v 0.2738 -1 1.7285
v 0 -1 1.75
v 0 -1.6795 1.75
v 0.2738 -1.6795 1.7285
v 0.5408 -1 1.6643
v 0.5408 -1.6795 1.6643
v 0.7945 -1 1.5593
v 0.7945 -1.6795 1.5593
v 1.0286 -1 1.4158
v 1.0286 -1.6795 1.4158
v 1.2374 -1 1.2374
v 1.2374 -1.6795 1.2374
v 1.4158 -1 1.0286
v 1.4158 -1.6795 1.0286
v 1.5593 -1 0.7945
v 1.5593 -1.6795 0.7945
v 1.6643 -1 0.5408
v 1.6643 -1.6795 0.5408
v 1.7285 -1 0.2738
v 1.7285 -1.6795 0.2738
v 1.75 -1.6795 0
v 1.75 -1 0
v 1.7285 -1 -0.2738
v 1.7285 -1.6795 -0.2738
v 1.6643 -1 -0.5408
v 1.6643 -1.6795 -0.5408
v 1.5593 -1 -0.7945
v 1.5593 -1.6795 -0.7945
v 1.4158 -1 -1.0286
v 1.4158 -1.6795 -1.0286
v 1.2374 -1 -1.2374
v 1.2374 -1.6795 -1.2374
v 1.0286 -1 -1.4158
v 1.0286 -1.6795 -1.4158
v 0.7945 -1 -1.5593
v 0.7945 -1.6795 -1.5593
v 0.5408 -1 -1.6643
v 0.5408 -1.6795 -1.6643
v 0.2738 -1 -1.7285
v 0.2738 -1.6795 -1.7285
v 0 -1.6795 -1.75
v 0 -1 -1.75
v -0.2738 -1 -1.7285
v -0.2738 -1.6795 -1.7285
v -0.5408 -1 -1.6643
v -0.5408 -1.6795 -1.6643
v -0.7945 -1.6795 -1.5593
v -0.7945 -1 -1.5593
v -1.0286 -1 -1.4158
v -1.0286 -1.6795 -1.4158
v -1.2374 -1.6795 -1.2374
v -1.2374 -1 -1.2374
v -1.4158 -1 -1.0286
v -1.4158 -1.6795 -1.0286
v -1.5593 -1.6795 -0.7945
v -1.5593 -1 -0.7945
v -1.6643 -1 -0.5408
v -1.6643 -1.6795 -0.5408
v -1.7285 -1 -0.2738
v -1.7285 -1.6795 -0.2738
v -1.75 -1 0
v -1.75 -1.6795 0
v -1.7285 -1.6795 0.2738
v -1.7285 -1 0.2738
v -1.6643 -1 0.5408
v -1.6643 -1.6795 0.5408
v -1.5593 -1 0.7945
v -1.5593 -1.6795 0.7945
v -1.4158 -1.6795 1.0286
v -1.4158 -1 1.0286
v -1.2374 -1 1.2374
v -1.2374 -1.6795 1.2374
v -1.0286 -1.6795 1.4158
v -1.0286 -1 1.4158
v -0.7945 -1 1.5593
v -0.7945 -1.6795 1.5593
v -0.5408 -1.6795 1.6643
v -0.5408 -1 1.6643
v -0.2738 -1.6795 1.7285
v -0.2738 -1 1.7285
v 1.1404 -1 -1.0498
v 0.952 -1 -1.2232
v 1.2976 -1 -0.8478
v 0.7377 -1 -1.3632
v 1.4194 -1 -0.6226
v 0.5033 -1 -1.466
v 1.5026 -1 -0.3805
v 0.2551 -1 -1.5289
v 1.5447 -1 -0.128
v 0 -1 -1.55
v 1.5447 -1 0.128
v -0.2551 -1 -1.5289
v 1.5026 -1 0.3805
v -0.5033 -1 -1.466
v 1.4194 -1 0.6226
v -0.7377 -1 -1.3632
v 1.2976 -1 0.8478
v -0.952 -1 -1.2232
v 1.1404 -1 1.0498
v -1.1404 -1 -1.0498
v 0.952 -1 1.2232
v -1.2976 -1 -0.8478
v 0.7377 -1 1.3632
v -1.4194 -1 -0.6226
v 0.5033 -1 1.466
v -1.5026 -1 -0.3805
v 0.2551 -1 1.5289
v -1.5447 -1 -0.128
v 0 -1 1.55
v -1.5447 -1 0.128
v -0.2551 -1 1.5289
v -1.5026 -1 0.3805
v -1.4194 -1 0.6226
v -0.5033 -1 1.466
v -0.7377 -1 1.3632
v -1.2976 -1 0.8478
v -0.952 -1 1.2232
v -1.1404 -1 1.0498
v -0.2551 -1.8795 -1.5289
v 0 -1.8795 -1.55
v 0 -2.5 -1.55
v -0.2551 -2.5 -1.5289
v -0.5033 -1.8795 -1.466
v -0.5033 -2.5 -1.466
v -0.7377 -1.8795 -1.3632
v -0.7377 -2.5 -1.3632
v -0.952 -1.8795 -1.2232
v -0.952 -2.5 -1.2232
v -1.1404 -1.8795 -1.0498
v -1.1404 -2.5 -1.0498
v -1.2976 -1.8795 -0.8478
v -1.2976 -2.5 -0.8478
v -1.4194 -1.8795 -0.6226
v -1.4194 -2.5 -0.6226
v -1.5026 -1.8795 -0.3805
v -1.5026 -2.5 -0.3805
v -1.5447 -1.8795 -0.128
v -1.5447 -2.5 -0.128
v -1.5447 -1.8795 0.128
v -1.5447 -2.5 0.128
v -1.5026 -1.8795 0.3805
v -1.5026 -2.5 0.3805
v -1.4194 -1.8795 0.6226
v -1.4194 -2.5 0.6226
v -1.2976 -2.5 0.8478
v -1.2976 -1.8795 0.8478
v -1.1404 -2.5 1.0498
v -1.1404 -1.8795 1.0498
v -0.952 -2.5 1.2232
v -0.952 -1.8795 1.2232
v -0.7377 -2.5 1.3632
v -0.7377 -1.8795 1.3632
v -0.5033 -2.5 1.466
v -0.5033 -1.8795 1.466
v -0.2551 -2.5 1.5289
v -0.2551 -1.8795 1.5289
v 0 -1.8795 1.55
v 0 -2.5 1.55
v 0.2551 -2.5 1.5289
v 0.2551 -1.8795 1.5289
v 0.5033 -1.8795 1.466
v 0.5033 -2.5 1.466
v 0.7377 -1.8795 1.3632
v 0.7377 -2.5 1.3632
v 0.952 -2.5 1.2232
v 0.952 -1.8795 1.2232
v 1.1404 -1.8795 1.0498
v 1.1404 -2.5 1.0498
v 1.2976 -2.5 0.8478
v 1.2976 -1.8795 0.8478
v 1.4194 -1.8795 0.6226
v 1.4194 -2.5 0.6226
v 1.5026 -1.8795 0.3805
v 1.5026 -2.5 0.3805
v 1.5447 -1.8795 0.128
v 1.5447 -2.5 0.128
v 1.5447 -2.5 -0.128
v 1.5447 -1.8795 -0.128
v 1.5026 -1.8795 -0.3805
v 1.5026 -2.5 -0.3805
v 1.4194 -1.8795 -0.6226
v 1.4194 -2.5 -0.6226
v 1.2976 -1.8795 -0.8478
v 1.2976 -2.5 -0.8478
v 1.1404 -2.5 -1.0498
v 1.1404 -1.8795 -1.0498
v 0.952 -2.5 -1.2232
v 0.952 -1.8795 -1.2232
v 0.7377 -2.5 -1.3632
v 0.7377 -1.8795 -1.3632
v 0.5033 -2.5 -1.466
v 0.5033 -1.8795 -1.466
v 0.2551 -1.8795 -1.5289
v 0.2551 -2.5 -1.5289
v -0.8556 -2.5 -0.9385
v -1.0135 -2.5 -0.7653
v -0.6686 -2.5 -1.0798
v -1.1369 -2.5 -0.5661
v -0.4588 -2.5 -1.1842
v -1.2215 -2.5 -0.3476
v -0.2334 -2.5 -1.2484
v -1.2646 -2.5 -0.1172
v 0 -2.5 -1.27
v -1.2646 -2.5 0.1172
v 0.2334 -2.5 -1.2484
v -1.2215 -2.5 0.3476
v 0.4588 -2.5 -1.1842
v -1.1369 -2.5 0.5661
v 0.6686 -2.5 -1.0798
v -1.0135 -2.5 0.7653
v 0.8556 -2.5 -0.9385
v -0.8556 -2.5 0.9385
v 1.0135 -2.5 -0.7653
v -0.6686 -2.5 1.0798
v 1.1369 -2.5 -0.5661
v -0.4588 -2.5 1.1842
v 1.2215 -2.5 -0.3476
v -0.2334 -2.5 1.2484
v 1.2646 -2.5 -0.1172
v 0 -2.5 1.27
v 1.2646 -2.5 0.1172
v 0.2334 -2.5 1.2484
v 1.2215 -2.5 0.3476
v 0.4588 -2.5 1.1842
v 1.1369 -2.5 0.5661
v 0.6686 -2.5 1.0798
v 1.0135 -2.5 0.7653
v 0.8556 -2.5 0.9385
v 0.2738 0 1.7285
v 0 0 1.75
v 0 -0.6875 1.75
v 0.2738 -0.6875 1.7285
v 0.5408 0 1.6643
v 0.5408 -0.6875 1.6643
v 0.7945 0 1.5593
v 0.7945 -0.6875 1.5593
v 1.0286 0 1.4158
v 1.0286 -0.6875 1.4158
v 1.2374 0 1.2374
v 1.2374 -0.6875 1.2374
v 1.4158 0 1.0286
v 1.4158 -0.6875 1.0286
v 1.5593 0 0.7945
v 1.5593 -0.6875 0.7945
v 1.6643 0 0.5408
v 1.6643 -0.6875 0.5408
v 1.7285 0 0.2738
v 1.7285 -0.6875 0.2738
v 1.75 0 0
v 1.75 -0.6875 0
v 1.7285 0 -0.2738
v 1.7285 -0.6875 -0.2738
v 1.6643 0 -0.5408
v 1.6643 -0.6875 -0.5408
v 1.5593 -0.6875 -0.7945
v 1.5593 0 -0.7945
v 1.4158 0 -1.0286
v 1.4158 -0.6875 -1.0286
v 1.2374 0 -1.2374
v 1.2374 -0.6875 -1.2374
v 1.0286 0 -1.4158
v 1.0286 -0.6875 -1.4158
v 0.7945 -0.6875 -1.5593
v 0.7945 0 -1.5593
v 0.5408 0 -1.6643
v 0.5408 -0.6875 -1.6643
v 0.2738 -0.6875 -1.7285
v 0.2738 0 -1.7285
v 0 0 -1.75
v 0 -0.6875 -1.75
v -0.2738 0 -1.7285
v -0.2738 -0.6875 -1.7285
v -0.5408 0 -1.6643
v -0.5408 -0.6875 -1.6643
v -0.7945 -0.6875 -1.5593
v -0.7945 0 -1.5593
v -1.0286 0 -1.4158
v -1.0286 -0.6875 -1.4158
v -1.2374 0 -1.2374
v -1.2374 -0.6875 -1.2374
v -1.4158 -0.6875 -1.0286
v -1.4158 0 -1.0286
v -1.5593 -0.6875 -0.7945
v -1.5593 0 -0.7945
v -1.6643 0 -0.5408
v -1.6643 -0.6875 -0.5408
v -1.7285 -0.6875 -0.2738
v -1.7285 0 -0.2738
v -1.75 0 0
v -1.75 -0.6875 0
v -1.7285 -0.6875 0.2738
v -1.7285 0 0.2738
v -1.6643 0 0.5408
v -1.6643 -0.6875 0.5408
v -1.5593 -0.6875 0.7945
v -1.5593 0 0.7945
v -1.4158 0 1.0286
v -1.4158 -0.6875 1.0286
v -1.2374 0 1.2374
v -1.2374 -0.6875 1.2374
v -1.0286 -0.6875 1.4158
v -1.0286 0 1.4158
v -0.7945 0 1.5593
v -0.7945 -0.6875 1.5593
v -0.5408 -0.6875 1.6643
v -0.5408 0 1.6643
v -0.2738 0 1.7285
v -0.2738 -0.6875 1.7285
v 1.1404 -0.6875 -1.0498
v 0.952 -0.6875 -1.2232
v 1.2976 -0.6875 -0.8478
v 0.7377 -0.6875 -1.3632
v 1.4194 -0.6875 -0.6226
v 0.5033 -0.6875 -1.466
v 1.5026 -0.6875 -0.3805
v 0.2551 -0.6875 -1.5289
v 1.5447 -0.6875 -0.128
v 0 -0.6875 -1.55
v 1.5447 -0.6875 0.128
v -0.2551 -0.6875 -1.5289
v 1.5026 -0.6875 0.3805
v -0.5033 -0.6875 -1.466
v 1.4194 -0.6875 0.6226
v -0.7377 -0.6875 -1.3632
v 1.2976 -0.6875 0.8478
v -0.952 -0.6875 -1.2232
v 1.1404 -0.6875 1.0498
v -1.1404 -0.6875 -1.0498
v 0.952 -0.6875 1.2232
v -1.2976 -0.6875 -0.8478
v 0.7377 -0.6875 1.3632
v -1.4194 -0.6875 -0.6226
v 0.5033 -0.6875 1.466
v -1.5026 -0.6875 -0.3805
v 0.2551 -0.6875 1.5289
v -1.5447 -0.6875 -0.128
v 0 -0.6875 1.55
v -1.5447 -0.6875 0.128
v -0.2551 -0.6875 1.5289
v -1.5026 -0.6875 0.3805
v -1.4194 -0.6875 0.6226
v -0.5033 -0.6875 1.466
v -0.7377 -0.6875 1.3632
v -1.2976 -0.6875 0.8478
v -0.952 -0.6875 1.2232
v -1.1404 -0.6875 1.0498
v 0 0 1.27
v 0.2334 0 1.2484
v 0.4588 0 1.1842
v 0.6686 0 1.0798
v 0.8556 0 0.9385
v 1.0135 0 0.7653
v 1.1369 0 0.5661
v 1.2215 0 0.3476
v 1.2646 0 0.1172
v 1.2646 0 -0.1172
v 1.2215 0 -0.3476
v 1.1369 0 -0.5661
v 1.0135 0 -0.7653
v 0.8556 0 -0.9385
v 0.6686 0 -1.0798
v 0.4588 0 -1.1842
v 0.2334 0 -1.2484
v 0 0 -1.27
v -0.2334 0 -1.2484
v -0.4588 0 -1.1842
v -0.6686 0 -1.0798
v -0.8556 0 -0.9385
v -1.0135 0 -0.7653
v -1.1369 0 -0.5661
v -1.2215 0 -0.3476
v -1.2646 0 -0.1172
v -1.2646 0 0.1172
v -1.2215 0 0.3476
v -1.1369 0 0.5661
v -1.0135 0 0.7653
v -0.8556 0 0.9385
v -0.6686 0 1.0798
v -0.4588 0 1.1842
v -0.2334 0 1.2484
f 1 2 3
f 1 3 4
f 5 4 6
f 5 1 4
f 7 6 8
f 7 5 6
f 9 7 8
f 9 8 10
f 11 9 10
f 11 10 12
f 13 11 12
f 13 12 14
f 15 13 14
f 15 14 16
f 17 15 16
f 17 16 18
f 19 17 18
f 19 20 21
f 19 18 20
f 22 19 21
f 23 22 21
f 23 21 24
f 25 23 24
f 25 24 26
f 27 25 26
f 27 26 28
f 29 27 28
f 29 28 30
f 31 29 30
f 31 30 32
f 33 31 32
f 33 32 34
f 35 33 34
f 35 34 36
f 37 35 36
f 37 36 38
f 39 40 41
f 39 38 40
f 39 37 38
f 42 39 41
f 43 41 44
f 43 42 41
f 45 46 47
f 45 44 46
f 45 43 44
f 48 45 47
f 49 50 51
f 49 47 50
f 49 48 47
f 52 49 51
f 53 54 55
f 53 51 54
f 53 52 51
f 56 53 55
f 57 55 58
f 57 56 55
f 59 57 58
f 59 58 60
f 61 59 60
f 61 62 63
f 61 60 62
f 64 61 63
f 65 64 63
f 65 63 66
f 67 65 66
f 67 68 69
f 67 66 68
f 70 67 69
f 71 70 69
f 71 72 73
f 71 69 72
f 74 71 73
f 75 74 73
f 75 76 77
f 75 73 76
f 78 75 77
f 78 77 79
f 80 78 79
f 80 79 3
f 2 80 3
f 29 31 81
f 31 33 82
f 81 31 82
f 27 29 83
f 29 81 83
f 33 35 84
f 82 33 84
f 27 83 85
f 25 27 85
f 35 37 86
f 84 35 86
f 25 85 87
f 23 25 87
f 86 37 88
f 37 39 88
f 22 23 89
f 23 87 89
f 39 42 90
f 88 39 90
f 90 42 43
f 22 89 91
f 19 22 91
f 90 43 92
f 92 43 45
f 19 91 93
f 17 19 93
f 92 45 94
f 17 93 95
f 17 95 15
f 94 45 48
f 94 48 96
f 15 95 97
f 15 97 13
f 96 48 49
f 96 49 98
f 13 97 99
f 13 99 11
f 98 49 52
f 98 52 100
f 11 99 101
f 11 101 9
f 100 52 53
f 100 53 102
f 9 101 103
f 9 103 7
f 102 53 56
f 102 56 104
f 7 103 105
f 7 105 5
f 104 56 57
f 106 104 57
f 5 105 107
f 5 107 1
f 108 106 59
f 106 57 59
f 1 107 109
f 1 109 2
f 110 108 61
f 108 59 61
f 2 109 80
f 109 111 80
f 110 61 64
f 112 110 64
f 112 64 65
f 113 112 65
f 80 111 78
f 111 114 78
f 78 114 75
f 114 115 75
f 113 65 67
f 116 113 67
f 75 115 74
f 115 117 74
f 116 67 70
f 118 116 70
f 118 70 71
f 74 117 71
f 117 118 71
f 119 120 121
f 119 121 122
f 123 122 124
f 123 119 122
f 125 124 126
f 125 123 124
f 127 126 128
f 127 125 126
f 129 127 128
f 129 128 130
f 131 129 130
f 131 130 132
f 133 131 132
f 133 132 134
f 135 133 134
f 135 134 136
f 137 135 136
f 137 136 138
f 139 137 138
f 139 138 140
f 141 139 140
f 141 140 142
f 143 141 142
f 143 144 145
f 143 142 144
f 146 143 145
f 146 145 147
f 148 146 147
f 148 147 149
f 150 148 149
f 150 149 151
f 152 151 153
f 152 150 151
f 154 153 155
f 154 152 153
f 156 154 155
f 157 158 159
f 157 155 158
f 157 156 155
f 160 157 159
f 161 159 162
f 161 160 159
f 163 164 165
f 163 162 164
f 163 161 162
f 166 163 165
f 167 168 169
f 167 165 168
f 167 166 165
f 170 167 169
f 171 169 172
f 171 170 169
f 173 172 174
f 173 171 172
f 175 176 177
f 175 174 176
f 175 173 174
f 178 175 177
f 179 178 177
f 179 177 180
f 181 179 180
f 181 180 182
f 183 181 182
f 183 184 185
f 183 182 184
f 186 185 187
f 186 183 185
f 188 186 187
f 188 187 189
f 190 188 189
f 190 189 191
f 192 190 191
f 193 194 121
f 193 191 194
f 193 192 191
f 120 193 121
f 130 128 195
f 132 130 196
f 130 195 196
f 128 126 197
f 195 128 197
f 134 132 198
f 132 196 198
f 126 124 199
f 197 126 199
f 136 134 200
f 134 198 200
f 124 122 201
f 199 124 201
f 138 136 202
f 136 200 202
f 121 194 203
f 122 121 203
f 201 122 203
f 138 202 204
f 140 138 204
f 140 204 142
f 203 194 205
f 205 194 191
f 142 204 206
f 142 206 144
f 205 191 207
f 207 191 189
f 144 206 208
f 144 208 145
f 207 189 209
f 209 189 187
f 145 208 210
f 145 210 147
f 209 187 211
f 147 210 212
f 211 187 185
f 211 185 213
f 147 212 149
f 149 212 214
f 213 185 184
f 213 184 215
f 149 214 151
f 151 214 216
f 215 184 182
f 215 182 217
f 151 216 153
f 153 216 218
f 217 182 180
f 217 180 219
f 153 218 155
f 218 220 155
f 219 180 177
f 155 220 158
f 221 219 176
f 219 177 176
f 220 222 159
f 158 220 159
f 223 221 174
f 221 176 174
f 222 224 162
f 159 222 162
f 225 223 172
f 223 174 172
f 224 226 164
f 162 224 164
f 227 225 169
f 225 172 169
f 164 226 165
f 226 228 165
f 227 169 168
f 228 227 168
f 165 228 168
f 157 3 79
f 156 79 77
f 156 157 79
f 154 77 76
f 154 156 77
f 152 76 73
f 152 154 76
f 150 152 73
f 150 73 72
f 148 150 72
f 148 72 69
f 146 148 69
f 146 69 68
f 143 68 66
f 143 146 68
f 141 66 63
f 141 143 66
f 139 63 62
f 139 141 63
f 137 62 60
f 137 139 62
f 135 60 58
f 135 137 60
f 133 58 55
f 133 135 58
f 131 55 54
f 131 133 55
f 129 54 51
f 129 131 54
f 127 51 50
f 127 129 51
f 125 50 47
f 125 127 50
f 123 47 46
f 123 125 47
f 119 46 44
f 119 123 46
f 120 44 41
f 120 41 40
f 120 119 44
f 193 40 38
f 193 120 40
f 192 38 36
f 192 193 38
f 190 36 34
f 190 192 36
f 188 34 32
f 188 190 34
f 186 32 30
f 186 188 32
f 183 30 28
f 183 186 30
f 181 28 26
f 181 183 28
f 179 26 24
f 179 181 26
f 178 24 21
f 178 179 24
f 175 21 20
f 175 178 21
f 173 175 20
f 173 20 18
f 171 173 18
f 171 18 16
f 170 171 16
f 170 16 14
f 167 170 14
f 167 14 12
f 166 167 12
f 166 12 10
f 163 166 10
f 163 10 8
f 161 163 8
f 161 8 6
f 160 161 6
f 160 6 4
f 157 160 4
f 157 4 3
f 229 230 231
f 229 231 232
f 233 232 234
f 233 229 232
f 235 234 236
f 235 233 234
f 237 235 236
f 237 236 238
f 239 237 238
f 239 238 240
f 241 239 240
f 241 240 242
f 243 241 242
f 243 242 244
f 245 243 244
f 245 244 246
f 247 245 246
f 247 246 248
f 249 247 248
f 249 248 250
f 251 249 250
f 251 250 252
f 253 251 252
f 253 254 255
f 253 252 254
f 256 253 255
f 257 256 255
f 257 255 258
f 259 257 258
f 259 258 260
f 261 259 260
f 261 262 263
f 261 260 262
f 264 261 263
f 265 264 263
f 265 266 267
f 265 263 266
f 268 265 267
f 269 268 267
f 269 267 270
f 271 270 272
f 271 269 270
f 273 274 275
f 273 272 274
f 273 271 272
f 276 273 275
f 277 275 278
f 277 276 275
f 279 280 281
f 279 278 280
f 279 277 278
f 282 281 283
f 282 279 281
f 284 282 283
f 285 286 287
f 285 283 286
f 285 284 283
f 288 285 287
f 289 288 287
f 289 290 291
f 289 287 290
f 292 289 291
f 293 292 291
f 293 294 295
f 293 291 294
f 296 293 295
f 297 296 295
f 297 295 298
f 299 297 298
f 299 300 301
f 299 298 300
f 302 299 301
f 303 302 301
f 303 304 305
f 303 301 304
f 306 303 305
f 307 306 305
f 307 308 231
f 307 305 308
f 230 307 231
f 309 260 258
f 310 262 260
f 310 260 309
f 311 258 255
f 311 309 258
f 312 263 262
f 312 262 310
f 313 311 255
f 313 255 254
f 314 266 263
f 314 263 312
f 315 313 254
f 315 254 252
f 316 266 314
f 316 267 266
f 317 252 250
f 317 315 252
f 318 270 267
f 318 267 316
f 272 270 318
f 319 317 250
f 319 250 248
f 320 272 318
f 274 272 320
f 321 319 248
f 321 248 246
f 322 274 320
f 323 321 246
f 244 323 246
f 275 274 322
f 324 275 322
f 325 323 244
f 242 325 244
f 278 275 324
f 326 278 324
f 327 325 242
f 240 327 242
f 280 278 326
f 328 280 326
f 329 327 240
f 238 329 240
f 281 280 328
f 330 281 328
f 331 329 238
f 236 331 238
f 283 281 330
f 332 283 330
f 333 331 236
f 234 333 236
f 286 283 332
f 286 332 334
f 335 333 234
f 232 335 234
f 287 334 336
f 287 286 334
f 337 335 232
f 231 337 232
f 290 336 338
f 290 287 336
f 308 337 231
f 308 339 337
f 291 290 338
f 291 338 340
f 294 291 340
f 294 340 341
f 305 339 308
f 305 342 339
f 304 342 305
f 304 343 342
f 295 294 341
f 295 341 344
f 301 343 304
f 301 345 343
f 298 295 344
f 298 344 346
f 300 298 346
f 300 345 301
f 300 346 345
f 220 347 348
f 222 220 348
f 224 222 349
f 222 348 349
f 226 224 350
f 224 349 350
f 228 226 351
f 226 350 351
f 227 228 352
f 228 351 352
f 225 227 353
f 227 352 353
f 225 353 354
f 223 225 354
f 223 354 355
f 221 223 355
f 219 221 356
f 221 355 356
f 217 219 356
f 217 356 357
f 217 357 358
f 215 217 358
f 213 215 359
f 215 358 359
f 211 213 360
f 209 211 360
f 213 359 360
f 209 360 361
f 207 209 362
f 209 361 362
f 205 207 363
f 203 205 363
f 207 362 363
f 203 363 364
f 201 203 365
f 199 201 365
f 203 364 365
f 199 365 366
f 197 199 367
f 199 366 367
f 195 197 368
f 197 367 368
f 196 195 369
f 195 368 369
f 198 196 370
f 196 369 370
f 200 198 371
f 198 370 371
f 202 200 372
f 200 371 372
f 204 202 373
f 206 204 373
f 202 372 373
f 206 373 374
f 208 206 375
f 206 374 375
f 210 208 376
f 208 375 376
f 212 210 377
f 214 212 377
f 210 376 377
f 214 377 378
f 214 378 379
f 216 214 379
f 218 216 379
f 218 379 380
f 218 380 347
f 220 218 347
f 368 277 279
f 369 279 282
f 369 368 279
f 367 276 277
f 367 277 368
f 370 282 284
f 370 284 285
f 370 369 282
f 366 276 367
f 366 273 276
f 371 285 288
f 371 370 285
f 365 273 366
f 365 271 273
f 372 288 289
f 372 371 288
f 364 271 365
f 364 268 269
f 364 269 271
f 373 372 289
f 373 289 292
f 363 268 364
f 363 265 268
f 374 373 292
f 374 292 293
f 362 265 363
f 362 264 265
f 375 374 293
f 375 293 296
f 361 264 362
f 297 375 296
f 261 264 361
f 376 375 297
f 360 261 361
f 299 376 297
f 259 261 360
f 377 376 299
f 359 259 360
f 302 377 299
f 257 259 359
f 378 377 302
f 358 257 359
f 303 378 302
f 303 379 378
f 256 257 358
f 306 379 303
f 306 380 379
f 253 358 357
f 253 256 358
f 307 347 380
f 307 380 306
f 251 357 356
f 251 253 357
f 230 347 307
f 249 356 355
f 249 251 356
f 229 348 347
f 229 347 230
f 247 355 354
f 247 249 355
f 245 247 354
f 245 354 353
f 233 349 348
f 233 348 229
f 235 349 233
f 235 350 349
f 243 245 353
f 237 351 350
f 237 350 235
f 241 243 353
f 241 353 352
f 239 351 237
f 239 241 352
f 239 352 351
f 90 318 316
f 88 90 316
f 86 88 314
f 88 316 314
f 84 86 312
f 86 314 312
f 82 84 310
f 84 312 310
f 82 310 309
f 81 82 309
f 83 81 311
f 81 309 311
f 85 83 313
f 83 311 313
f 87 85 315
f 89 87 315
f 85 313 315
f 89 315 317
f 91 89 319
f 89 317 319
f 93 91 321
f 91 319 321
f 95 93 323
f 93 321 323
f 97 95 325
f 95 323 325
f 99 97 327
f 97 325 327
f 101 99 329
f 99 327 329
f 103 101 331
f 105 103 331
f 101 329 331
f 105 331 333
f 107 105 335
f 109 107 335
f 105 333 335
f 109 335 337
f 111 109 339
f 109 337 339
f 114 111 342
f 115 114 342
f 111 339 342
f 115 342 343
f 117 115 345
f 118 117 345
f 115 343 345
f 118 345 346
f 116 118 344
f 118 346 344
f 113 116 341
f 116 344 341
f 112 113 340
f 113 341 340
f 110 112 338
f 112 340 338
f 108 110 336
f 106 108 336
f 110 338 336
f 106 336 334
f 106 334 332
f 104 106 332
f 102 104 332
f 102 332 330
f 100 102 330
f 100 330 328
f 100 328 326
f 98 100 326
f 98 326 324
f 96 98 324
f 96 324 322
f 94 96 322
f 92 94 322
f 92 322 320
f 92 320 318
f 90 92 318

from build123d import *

# Parameters (mm, degrees)
SKETCH1_R           = 1.750000056
SKETCH1_R_2         = 1.27
BOSS_EXTRUDE1_DEPTH = 2.50000008
CUT_EXTRUDE1_START  = -0.31250001
SKETCH2_R           = 1.750000056
SKETCH2_R_2         = 1.549999948
CUT_EXTRUDE1_DEPTH  = 0.31250001
CHAMFER1_SIZE       = 0.508
CUT_EXTRUDE2_START  = -1.81250001
SKETCH2_2_R         = 1.750000056
SKETCH2_2_R_2       = 1.549999948
CUT_EXTRUDE2_DEPTH  = 0.31250001


with BuildPart() as part:
    # Sketch1 → Boss-Extrude1 (new body)
    with BuildSketch(Plane(origin=(0, 0, 0), x_dir=(1, 0, 0), z_dir=(0, 1, 0))):
        with Locations(Location((0, 0, 0), (0, 0, 270))):
            Circle(SKETCH1_R)
        with Locations(Location((0, 0, 0), (0, 0, 270))):
            Circle(SKETCH1_R_2, mode=Mode.SUBTRACT)
    extrude(amount=-BOSS_EXTRUDE1_DEPTH)

    # Sketch2 → Cut-Extrude1 (cut)
    with BuildSketch(Plane.XZ.offset(2.50000008).offset(CUT_EXTRUDE1_START)):
        with Locations(Location((0, 0, 0), (0, 0, 90))):
            Circle(SKETCH2_R)
        with Locations(Location((0, 0, 0), (0, 0, 270))):
            Circle(SKETCH2_R_2, mode=Mode.SUBTRACT)
    extrude(amount=CUT_EXTRUDE1_DEPTH, mode=Mode.SUBTRACT)

    # Chamfer1
    # the kernel refuses this chamfer: 0.508 mm, written as the material it takes off along each edge
    with BuildSketch(Plane(origin=(0, -2.18750007, 0), x_dir=(0, 0, 1), z_dir=(1, 0, 0))) as chamfer1_piece_1_section:
        Polygon((1.750000056, -CHAMFER1_SIZE), (1.750000056 - CHAMFER1_SIZE, 0), (1.750000056, 0), align=None)
    chamfer1_piece_1 = revolve(axis=Axis((0, -2.18750007, 0), (0, -1, 0)), mode=Mode.PRIVATE)
    chamfer1_piece_1 = chamfer1_piece_1 - Plane(origin=(0, -1.779243364, 0), x_dir=(0, 0, -1), z_dir=(0, 1, 0)) * Cylinder(1.549999948, 8, mode=Mode.PRIVATE)
    add(chamfer1_piece_1, mode=Mode.SUBTRACT)

    # Sketch2<2> → Cut-Extrude2 (cut)
    with BuildSketch(Plane.XZ.offset(2.50000008).offset(CUT_EXTRUDE2_START)):
        with Locations(Location((0, 0, 0), (0, 0, 90))):
            Circle(SKETCH2_2_R)
        with Locations(Location((0, 0, 0), (0, 0, 270))):
            Circle(SKETCH2_2_R_2, mode=Mode.SUBTRACT)
    extrude(amount=CUT_EXTRUDE2_DEPTH, mode=Mode.SUBTRACT)


solid = part.part
